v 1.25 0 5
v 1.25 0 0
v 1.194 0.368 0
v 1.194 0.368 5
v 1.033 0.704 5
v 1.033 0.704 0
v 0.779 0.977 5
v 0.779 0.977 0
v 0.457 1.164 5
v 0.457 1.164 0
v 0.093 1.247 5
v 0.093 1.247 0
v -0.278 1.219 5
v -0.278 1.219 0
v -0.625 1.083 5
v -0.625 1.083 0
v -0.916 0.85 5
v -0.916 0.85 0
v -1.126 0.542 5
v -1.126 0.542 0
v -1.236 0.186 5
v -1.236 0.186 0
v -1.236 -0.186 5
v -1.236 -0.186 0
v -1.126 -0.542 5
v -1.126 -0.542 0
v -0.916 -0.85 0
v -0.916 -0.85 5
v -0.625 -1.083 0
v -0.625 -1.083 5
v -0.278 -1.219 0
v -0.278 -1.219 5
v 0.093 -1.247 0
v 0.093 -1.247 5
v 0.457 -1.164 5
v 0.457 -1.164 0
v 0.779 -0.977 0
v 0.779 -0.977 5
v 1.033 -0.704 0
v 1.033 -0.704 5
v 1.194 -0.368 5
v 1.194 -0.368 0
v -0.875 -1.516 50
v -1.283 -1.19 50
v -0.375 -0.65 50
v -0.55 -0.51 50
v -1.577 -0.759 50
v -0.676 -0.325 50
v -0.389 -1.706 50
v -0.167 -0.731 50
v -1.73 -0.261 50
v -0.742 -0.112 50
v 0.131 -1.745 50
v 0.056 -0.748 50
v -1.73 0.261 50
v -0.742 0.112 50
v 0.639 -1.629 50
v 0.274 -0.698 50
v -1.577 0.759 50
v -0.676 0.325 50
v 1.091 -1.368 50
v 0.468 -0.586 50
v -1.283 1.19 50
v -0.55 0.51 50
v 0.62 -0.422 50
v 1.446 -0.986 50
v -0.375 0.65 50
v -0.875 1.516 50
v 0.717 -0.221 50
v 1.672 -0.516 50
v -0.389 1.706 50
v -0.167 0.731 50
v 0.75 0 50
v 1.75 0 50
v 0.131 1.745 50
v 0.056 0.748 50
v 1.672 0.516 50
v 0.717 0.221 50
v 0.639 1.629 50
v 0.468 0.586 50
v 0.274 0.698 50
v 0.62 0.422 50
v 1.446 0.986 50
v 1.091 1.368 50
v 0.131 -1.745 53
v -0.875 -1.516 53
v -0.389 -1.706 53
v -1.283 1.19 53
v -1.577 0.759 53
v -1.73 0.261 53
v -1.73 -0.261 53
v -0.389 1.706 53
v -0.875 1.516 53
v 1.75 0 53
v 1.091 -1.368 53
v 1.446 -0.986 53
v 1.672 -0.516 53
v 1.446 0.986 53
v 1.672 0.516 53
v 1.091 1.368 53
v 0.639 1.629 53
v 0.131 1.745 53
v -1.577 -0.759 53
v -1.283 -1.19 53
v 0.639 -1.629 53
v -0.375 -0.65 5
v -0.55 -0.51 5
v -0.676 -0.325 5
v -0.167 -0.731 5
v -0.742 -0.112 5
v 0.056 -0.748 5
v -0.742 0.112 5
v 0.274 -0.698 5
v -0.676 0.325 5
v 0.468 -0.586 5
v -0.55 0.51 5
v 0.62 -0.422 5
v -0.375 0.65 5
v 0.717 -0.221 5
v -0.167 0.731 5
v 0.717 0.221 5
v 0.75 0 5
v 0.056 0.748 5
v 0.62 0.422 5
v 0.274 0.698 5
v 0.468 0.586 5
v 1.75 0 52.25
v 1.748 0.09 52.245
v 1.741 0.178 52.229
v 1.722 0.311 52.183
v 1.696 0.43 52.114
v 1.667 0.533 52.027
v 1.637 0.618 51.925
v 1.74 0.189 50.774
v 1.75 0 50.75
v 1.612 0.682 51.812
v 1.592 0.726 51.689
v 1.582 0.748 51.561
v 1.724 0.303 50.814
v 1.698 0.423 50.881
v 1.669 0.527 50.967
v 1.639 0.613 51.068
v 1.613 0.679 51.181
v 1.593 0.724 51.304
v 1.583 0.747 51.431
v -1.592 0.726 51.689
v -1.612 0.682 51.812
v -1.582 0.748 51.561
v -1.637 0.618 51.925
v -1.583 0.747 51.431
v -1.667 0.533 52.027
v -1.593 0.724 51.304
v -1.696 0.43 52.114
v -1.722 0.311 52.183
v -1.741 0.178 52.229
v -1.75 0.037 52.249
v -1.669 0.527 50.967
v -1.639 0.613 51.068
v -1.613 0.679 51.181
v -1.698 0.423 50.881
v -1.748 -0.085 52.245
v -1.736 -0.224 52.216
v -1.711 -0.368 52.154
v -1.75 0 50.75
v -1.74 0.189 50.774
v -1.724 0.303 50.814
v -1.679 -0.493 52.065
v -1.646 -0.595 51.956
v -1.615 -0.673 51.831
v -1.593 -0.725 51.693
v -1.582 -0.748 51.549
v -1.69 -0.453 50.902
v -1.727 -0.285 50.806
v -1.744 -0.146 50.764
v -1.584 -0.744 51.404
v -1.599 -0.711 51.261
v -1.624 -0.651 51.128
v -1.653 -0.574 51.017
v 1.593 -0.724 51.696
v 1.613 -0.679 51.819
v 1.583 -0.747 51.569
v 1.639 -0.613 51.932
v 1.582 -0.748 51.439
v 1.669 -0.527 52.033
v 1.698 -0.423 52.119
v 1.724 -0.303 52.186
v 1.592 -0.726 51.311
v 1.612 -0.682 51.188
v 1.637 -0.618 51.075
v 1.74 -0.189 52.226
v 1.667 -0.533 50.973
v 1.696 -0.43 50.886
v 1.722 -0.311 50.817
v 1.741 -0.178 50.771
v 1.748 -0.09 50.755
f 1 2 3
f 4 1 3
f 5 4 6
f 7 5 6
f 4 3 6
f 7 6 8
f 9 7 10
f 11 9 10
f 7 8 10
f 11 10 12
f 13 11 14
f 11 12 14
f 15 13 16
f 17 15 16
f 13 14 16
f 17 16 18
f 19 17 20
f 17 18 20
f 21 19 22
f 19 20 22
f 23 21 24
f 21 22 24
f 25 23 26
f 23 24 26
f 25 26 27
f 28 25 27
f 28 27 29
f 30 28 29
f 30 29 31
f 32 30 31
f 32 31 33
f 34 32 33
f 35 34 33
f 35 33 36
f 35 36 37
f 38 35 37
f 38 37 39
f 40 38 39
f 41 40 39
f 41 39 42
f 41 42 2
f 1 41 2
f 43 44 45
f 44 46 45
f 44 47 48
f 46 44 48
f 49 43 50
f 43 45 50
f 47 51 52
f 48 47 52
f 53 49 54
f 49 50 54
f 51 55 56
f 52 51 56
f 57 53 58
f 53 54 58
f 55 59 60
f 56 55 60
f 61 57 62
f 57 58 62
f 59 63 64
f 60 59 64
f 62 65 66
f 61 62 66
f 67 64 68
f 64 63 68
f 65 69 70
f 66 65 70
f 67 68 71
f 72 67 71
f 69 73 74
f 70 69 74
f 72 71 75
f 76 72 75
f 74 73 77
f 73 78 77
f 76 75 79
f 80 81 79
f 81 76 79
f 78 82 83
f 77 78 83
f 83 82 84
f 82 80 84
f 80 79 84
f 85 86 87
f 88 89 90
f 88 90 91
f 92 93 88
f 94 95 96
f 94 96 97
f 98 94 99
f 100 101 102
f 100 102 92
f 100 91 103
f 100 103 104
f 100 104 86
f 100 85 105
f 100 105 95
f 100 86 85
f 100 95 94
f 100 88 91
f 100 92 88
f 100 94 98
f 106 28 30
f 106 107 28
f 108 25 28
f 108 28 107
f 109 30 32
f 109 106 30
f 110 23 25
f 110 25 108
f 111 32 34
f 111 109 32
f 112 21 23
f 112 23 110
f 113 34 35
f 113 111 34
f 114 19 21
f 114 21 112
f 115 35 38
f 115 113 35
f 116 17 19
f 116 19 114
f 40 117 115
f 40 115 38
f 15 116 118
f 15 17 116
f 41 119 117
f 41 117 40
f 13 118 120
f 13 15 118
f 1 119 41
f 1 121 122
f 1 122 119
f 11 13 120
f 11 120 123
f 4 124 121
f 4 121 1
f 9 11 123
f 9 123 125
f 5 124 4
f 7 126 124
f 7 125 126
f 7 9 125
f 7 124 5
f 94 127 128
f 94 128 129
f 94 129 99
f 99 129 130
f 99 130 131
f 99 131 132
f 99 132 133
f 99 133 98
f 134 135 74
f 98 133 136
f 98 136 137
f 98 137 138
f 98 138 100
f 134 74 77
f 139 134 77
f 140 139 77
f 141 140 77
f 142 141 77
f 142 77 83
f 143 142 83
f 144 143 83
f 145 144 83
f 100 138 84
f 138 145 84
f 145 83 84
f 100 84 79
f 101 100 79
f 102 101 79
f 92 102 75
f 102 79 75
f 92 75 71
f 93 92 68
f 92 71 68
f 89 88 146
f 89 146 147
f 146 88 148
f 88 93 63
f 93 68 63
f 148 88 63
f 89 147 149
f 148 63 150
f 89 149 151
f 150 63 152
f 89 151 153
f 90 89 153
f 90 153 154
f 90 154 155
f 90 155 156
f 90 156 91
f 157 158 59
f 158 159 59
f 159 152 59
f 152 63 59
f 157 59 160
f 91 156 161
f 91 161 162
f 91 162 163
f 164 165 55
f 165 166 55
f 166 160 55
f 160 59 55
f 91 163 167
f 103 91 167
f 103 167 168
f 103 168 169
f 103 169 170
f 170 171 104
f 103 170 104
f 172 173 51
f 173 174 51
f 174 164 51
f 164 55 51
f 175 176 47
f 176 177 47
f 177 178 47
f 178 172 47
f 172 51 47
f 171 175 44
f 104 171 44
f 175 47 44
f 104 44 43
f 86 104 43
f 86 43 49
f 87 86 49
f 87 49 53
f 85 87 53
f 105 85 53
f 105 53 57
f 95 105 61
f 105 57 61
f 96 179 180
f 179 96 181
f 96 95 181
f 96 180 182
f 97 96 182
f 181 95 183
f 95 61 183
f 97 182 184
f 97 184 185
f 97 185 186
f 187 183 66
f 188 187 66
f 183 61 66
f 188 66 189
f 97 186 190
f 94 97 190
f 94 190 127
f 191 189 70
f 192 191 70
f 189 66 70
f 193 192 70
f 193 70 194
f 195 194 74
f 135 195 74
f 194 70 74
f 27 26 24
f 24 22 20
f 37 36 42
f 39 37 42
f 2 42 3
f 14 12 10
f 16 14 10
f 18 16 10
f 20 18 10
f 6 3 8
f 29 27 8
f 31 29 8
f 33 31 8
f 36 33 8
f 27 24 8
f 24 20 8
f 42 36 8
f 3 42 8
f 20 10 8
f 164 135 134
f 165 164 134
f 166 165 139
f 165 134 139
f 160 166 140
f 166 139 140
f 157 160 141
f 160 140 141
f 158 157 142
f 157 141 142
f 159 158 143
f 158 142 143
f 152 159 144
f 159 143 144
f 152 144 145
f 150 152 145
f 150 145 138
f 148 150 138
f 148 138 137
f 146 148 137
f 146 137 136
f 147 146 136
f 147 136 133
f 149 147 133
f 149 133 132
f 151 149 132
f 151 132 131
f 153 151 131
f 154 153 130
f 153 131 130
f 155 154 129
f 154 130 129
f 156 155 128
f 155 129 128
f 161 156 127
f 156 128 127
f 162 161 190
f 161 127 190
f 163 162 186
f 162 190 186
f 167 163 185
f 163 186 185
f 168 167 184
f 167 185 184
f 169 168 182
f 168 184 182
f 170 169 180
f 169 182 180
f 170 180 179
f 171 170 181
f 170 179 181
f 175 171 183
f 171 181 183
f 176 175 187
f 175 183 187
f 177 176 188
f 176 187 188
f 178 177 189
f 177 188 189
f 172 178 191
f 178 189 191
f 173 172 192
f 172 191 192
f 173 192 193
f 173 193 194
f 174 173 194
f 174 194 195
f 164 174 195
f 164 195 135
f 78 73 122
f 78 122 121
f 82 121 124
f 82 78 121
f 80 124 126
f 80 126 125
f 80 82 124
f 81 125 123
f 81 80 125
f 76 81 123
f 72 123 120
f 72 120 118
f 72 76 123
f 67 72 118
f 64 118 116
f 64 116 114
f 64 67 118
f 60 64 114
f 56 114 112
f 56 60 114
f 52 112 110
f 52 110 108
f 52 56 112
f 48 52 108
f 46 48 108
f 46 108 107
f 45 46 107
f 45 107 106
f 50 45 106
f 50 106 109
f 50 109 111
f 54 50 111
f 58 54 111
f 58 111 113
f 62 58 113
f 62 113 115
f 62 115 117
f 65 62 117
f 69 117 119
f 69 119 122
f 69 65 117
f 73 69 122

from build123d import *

# Parameters (mm, degrees)
IZIM1_R                     = 1.25
Y_KSEKLIK_EKSTR_ZYON1_DEPTH = 50
IZIM2_R                     = 1.25
IZIM2_R_2                   = 0.75
KES_EKSTR_ZYON1_DEPTH       = 45
IZIM3_R                     = 1.75
Y_KSEKLIK_EKSTR_ZYON2_DEPTH = 3
IZIM4_R                     = 0.75
KES_EKSTR_ZYON2_DEPTH       = 4.5


with BuildPart() as part:
    # Çizim1 → Yükseklik-Ekstrüzyon1 (new body)
    with BuildSketch(Plane.XY):
        Circle(IZIM1_R)
    extrude(amount=Y_KSEKLIK_EKSTR_ZYON1_DEPTH)

    # Çizim2 → Kes-Ekstrüzyon1 (cut)
    with BuildSketch(Plane.XY.offset(50)):
        Circle(IZIM2_R)
        Circle(IZIM2_R_2, mode=Mode.SUBTRACT)
    extrude(amount=-KES_EKSTR_ZYON1_DEPTH, mode=Mode.SUBTRACT)

    # Çizim3 → Yükseklik-Ekstrüzyon2 (add)
    with BuildSketch(Plane.XY.offset(50)):
        Circle(IZIM3_R)
    extrude(amount=Y_KSEKLIK_EKSTR_ZYON2_DEPTH)

    # Çizim4 → Kes-Ekstrüzyon2 (cut, through all)
    with BuildSketch(Plane(origin=(1.75, 0, 0), x_dir=(0, 0, -1), z_dir=(1, 0, 0))):
        with Locations((-51.5, 0)):
            Circle(IZIM4_R)
    extrude(amount=-KES_EKSTR_ZYON2_DEPTH, mode=Mode.SUBTRACT)


solid = part.part
